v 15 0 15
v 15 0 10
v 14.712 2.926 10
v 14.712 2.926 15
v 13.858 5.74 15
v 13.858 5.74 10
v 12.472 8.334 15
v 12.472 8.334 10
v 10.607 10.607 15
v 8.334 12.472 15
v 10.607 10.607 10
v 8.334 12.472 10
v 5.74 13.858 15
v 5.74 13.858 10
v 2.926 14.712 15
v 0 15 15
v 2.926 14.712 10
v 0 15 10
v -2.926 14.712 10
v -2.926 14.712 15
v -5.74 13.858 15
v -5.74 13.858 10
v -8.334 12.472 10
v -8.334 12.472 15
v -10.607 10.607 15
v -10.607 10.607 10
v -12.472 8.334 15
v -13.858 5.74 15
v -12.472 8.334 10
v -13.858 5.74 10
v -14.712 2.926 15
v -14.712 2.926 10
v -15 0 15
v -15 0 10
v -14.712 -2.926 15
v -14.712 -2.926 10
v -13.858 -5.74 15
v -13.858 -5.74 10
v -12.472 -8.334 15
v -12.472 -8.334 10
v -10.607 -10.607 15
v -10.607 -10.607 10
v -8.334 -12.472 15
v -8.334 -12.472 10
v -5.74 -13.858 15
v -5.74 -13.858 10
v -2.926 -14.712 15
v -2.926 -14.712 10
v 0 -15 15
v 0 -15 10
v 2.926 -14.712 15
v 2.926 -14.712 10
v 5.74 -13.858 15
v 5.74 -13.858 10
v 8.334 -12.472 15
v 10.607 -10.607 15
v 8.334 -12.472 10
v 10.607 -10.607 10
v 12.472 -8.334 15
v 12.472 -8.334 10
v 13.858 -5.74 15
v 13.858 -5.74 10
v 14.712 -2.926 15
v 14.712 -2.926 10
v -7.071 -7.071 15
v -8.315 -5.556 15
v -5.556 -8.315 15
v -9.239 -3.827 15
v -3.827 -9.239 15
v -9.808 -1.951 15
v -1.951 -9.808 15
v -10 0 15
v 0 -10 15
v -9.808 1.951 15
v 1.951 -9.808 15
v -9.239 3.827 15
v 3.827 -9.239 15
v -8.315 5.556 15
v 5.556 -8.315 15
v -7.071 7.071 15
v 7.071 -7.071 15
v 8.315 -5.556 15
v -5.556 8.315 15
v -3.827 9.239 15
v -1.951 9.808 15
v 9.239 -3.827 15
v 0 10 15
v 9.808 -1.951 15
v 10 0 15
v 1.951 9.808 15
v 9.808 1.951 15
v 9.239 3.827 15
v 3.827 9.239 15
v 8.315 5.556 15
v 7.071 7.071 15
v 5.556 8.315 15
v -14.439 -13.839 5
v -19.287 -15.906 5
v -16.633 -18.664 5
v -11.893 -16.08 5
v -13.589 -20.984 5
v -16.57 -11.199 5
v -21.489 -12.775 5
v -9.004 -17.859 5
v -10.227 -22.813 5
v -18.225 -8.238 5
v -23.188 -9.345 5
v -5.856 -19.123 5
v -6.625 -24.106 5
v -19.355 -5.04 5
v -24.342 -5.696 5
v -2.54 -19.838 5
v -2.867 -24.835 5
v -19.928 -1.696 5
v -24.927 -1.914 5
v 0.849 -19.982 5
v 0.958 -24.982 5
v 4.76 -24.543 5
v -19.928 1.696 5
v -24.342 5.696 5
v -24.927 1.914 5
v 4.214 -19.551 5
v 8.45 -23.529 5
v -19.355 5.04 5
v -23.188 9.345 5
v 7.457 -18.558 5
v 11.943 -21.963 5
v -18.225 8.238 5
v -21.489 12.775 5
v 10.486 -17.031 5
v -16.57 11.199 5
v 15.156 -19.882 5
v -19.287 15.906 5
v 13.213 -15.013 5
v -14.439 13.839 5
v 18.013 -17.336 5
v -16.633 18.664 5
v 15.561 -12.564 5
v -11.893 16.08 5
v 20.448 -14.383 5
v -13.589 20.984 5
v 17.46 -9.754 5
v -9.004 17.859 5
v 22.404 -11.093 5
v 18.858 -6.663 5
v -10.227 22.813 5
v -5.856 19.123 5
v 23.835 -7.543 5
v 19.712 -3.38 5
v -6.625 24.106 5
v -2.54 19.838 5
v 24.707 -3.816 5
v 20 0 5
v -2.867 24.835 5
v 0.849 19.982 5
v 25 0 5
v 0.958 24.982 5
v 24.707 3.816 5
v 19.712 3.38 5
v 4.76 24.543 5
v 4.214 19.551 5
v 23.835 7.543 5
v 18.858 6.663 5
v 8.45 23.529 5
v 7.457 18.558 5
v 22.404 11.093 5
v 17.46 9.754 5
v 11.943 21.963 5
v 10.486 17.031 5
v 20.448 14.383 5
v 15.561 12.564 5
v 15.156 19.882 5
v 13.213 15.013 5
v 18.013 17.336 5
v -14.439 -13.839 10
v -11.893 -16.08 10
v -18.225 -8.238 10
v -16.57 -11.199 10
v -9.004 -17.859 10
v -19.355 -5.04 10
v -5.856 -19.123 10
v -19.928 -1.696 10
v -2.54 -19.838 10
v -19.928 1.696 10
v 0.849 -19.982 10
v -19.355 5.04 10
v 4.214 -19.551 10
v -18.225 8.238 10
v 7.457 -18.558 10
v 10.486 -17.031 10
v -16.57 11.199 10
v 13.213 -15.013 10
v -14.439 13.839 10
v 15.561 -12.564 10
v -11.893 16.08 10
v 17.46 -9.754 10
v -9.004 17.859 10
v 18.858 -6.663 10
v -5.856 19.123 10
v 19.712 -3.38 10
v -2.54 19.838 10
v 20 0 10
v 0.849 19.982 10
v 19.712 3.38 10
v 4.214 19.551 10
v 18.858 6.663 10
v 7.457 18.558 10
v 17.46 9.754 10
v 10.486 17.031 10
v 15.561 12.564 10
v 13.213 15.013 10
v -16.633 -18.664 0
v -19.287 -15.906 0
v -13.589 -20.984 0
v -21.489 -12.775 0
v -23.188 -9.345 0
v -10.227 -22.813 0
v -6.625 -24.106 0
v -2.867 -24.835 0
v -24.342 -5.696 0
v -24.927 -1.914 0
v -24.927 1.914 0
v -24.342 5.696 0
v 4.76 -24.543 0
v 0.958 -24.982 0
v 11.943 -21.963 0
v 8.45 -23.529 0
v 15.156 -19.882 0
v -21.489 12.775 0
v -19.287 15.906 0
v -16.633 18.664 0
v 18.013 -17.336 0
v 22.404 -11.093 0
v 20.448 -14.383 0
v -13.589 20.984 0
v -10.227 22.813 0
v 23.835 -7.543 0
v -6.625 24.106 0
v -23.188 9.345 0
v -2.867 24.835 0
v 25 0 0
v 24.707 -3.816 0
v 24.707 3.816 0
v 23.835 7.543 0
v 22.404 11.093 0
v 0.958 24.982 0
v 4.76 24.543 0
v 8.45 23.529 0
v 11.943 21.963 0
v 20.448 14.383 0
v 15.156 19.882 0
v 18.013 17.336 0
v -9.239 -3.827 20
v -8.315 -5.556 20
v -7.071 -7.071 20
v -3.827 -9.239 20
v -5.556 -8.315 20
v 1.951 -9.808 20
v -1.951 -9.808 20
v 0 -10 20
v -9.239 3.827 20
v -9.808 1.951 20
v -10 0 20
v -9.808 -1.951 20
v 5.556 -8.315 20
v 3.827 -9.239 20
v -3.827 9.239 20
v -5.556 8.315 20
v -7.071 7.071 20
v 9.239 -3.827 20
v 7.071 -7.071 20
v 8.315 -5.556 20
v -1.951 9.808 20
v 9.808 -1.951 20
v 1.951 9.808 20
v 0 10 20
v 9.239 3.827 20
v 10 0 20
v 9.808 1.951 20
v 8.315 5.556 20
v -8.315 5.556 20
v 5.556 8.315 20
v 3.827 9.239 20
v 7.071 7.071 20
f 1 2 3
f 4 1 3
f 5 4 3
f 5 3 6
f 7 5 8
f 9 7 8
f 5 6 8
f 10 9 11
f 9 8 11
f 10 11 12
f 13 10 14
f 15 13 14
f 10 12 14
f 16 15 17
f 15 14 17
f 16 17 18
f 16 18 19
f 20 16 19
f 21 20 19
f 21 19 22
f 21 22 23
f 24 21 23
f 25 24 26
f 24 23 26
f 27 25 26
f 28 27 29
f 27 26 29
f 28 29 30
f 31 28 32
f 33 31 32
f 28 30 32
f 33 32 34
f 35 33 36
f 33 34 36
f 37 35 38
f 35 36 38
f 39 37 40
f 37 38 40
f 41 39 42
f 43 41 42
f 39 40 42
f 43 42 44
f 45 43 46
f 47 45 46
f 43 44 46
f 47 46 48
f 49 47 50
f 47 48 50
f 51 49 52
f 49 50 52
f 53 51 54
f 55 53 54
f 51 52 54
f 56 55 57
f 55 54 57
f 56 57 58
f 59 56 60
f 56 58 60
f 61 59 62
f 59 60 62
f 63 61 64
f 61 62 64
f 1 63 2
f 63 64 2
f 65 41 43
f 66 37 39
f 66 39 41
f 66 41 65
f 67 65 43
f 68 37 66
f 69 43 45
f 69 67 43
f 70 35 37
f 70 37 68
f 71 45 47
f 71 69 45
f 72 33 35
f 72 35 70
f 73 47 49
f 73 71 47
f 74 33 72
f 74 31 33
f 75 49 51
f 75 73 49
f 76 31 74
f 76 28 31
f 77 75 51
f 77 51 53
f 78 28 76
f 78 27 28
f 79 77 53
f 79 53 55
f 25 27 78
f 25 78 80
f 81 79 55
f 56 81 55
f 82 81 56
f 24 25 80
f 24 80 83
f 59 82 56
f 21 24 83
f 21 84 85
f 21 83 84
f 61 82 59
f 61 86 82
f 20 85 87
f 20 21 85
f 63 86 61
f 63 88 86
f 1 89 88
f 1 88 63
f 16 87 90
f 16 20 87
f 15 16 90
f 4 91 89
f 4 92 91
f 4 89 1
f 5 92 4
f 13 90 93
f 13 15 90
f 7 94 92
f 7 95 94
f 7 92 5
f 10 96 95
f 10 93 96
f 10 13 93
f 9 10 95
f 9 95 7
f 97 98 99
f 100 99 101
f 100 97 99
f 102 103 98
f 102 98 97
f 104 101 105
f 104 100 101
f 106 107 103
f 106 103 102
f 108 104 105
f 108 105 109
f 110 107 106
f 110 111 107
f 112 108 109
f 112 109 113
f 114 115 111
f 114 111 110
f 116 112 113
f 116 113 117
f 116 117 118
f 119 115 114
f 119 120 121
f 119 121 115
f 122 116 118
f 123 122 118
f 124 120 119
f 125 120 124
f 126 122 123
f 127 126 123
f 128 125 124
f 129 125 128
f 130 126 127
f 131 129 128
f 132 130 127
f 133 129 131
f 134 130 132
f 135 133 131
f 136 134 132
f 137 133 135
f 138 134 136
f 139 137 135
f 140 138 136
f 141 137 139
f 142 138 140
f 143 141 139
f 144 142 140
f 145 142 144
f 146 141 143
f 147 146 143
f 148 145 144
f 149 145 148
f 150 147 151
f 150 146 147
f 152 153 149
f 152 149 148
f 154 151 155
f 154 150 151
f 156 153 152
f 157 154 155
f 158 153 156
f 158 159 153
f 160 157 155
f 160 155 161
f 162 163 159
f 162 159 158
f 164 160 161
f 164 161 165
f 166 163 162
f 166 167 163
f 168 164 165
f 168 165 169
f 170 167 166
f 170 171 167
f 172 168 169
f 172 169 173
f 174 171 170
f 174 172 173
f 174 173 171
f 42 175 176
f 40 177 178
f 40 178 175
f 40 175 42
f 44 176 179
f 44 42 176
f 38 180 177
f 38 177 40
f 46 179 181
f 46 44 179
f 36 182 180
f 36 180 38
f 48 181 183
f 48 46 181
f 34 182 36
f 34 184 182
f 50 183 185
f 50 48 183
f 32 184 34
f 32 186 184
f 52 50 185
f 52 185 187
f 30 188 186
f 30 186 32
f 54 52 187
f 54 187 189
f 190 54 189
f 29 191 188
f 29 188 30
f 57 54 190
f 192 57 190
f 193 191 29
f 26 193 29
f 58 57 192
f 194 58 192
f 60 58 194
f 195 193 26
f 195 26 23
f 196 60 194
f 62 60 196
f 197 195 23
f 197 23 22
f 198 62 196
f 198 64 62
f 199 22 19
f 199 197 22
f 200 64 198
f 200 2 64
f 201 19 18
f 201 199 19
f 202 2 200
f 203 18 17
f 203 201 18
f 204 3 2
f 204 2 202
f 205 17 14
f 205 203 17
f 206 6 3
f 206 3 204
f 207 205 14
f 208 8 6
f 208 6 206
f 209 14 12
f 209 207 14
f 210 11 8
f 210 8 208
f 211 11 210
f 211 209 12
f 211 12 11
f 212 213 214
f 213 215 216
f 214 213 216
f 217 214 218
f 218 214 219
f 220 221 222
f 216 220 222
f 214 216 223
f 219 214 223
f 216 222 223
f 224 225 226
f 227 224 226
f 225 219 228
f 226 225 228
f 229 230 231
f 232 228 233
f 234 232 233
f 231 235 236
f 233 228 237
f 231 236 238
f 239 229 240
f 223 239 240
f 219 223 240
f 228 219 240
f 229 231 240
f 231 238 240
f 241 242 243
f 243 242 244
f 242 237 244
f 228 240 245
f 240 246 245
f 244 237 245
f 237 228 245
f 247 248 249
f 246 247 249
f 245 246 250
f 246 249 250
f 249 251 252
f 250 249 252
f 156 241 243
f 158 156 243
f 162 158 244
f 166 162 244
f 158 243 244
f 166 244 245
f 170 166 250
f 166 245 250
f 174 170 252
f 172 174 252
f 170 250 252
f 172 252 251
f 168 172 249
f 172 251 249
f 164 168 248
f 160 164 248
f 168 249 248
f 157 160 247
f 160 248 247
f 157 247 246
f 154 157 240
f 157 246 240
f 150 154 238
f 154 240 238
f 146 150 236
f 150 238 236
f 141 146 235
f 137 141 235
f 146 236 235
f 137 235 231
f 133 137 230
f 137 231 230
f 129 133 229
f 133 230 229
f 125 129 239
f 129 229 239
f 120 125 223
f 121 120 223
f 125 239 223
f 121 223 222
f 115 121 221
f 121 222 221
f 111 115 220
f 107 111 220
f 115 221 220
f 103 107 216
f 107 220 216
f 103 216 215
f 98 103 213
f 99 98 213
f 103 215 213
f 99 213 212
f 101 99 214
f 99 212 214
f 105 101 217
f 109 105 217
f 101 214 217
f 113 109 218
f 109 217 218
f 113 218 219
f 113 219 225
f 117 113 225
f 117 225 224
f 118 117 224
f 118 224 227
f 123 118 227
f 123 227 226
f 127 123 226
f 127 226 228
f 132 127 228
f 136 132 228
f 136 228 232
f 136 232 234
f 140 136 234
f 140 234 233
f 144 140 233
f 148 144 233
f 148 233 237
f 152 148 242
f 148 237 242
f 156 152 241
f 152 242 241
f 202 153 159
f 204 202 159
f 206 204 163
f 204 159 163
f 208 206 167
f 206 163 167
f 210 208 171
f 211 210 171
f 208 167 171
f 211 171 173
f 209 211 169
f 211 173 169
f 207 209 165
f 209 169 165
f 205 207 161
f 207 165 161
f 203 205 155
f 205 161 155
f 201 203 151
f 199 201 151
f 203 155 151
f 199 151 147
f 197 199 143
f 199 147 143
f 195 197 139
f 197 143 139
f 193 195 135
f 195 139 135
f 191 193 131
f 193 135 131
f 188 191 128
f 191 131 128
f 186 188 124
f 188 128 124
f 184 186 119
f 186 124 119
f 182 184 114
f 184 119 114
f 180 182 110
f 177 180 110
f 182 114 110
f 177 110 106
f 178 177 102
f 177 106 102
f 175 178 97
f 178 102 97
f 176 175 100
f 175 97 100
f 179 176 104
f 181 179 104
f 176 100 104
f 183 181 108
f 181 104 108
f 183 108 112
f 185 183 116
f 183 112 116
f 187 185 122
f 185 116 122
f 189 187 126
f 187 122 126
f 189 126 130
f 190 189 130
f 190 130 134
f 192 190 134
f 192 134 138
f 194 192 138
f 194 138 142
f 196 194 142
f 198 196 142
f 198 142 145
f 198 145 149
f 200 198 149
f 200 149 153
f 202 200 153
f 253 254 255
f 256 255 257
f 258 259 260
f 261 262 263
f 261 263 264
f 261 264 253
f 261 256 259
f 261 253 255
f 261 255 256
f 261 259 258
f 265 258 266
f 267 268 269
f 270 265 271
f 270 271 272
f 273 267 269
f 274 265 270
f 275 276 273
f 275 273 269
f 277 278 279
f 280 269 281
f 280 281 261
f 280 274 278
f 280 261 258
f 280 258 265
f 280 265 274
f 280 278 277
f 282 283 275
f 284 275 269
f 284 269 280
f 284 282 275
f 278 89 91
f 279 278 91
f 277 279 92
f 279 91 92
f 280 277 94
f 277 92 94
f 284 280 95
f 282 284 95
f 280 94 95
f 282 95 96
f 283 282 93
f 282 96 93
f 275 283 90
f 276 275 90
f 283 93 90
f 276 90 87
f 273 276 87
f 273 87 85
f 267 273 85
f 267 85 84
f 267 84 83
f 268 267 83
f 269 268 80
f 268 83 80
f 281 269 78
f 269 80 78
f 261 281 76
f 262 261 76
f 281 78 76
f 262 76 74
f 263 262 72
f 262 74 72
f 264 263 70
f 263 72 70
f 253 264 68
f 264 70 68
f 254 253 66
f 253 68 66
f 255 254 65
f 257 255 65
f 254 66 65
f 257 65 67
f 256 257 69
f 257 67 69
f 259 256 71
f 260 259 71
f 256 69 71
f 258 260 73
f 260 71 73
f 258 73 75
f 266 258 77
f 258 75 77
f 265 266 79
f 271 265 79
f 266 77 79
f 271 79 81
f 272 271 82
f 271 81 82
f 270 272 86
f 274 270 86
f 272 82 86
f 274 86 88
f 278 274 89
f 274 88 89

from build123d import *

# Parameters (mm, degrees)
SKETCH_1_R      = 25
EXTRUDE_1_DEPTH = 5
SKETCH_2_R      = 20
EXTRUDE_2_DEPTH = 5
SKETCH_3_R      = 15
EXTRUDE_3_DEPTH = 5
SKETCH_4_R      = 10
EXTRUDE_4_DEPTH = 5


with BuildPart() as part:
    # Эскиз1 → Бобышка-Вытянуть1 (new body)
    with BuildSketch(Plane.XY):
        Circle(SKETCH_1_R)
    extrude(amount=EXTRUDE_1_DEPTH)

    # Эскиз2 → Бобышка-Вытянуть2 (add)
    with BuildSketch(Plane.XY.offset(5)):
        Circle(SKETCH_2_R)
    extrude(amount=EXTRUDE_2_DEPTH)

    # Эскиз3 → Бобышка-Вытянуть3 (add)
    with BuildSketch(Plane.XY.offset(10)):
        Circle(SKETCH_3_R)
    extrude(amount=EXTRUDE_3_DEPTH)

    # Эскиз4 → Бобышка-Вытянуть4 (add)
    with BuildSketch(Plane.XY.offset(15)):
        Circle(SKETCH_4_R)
    extrude(amount=EXTRUDE_4_DEPTH)


solid = part.part
